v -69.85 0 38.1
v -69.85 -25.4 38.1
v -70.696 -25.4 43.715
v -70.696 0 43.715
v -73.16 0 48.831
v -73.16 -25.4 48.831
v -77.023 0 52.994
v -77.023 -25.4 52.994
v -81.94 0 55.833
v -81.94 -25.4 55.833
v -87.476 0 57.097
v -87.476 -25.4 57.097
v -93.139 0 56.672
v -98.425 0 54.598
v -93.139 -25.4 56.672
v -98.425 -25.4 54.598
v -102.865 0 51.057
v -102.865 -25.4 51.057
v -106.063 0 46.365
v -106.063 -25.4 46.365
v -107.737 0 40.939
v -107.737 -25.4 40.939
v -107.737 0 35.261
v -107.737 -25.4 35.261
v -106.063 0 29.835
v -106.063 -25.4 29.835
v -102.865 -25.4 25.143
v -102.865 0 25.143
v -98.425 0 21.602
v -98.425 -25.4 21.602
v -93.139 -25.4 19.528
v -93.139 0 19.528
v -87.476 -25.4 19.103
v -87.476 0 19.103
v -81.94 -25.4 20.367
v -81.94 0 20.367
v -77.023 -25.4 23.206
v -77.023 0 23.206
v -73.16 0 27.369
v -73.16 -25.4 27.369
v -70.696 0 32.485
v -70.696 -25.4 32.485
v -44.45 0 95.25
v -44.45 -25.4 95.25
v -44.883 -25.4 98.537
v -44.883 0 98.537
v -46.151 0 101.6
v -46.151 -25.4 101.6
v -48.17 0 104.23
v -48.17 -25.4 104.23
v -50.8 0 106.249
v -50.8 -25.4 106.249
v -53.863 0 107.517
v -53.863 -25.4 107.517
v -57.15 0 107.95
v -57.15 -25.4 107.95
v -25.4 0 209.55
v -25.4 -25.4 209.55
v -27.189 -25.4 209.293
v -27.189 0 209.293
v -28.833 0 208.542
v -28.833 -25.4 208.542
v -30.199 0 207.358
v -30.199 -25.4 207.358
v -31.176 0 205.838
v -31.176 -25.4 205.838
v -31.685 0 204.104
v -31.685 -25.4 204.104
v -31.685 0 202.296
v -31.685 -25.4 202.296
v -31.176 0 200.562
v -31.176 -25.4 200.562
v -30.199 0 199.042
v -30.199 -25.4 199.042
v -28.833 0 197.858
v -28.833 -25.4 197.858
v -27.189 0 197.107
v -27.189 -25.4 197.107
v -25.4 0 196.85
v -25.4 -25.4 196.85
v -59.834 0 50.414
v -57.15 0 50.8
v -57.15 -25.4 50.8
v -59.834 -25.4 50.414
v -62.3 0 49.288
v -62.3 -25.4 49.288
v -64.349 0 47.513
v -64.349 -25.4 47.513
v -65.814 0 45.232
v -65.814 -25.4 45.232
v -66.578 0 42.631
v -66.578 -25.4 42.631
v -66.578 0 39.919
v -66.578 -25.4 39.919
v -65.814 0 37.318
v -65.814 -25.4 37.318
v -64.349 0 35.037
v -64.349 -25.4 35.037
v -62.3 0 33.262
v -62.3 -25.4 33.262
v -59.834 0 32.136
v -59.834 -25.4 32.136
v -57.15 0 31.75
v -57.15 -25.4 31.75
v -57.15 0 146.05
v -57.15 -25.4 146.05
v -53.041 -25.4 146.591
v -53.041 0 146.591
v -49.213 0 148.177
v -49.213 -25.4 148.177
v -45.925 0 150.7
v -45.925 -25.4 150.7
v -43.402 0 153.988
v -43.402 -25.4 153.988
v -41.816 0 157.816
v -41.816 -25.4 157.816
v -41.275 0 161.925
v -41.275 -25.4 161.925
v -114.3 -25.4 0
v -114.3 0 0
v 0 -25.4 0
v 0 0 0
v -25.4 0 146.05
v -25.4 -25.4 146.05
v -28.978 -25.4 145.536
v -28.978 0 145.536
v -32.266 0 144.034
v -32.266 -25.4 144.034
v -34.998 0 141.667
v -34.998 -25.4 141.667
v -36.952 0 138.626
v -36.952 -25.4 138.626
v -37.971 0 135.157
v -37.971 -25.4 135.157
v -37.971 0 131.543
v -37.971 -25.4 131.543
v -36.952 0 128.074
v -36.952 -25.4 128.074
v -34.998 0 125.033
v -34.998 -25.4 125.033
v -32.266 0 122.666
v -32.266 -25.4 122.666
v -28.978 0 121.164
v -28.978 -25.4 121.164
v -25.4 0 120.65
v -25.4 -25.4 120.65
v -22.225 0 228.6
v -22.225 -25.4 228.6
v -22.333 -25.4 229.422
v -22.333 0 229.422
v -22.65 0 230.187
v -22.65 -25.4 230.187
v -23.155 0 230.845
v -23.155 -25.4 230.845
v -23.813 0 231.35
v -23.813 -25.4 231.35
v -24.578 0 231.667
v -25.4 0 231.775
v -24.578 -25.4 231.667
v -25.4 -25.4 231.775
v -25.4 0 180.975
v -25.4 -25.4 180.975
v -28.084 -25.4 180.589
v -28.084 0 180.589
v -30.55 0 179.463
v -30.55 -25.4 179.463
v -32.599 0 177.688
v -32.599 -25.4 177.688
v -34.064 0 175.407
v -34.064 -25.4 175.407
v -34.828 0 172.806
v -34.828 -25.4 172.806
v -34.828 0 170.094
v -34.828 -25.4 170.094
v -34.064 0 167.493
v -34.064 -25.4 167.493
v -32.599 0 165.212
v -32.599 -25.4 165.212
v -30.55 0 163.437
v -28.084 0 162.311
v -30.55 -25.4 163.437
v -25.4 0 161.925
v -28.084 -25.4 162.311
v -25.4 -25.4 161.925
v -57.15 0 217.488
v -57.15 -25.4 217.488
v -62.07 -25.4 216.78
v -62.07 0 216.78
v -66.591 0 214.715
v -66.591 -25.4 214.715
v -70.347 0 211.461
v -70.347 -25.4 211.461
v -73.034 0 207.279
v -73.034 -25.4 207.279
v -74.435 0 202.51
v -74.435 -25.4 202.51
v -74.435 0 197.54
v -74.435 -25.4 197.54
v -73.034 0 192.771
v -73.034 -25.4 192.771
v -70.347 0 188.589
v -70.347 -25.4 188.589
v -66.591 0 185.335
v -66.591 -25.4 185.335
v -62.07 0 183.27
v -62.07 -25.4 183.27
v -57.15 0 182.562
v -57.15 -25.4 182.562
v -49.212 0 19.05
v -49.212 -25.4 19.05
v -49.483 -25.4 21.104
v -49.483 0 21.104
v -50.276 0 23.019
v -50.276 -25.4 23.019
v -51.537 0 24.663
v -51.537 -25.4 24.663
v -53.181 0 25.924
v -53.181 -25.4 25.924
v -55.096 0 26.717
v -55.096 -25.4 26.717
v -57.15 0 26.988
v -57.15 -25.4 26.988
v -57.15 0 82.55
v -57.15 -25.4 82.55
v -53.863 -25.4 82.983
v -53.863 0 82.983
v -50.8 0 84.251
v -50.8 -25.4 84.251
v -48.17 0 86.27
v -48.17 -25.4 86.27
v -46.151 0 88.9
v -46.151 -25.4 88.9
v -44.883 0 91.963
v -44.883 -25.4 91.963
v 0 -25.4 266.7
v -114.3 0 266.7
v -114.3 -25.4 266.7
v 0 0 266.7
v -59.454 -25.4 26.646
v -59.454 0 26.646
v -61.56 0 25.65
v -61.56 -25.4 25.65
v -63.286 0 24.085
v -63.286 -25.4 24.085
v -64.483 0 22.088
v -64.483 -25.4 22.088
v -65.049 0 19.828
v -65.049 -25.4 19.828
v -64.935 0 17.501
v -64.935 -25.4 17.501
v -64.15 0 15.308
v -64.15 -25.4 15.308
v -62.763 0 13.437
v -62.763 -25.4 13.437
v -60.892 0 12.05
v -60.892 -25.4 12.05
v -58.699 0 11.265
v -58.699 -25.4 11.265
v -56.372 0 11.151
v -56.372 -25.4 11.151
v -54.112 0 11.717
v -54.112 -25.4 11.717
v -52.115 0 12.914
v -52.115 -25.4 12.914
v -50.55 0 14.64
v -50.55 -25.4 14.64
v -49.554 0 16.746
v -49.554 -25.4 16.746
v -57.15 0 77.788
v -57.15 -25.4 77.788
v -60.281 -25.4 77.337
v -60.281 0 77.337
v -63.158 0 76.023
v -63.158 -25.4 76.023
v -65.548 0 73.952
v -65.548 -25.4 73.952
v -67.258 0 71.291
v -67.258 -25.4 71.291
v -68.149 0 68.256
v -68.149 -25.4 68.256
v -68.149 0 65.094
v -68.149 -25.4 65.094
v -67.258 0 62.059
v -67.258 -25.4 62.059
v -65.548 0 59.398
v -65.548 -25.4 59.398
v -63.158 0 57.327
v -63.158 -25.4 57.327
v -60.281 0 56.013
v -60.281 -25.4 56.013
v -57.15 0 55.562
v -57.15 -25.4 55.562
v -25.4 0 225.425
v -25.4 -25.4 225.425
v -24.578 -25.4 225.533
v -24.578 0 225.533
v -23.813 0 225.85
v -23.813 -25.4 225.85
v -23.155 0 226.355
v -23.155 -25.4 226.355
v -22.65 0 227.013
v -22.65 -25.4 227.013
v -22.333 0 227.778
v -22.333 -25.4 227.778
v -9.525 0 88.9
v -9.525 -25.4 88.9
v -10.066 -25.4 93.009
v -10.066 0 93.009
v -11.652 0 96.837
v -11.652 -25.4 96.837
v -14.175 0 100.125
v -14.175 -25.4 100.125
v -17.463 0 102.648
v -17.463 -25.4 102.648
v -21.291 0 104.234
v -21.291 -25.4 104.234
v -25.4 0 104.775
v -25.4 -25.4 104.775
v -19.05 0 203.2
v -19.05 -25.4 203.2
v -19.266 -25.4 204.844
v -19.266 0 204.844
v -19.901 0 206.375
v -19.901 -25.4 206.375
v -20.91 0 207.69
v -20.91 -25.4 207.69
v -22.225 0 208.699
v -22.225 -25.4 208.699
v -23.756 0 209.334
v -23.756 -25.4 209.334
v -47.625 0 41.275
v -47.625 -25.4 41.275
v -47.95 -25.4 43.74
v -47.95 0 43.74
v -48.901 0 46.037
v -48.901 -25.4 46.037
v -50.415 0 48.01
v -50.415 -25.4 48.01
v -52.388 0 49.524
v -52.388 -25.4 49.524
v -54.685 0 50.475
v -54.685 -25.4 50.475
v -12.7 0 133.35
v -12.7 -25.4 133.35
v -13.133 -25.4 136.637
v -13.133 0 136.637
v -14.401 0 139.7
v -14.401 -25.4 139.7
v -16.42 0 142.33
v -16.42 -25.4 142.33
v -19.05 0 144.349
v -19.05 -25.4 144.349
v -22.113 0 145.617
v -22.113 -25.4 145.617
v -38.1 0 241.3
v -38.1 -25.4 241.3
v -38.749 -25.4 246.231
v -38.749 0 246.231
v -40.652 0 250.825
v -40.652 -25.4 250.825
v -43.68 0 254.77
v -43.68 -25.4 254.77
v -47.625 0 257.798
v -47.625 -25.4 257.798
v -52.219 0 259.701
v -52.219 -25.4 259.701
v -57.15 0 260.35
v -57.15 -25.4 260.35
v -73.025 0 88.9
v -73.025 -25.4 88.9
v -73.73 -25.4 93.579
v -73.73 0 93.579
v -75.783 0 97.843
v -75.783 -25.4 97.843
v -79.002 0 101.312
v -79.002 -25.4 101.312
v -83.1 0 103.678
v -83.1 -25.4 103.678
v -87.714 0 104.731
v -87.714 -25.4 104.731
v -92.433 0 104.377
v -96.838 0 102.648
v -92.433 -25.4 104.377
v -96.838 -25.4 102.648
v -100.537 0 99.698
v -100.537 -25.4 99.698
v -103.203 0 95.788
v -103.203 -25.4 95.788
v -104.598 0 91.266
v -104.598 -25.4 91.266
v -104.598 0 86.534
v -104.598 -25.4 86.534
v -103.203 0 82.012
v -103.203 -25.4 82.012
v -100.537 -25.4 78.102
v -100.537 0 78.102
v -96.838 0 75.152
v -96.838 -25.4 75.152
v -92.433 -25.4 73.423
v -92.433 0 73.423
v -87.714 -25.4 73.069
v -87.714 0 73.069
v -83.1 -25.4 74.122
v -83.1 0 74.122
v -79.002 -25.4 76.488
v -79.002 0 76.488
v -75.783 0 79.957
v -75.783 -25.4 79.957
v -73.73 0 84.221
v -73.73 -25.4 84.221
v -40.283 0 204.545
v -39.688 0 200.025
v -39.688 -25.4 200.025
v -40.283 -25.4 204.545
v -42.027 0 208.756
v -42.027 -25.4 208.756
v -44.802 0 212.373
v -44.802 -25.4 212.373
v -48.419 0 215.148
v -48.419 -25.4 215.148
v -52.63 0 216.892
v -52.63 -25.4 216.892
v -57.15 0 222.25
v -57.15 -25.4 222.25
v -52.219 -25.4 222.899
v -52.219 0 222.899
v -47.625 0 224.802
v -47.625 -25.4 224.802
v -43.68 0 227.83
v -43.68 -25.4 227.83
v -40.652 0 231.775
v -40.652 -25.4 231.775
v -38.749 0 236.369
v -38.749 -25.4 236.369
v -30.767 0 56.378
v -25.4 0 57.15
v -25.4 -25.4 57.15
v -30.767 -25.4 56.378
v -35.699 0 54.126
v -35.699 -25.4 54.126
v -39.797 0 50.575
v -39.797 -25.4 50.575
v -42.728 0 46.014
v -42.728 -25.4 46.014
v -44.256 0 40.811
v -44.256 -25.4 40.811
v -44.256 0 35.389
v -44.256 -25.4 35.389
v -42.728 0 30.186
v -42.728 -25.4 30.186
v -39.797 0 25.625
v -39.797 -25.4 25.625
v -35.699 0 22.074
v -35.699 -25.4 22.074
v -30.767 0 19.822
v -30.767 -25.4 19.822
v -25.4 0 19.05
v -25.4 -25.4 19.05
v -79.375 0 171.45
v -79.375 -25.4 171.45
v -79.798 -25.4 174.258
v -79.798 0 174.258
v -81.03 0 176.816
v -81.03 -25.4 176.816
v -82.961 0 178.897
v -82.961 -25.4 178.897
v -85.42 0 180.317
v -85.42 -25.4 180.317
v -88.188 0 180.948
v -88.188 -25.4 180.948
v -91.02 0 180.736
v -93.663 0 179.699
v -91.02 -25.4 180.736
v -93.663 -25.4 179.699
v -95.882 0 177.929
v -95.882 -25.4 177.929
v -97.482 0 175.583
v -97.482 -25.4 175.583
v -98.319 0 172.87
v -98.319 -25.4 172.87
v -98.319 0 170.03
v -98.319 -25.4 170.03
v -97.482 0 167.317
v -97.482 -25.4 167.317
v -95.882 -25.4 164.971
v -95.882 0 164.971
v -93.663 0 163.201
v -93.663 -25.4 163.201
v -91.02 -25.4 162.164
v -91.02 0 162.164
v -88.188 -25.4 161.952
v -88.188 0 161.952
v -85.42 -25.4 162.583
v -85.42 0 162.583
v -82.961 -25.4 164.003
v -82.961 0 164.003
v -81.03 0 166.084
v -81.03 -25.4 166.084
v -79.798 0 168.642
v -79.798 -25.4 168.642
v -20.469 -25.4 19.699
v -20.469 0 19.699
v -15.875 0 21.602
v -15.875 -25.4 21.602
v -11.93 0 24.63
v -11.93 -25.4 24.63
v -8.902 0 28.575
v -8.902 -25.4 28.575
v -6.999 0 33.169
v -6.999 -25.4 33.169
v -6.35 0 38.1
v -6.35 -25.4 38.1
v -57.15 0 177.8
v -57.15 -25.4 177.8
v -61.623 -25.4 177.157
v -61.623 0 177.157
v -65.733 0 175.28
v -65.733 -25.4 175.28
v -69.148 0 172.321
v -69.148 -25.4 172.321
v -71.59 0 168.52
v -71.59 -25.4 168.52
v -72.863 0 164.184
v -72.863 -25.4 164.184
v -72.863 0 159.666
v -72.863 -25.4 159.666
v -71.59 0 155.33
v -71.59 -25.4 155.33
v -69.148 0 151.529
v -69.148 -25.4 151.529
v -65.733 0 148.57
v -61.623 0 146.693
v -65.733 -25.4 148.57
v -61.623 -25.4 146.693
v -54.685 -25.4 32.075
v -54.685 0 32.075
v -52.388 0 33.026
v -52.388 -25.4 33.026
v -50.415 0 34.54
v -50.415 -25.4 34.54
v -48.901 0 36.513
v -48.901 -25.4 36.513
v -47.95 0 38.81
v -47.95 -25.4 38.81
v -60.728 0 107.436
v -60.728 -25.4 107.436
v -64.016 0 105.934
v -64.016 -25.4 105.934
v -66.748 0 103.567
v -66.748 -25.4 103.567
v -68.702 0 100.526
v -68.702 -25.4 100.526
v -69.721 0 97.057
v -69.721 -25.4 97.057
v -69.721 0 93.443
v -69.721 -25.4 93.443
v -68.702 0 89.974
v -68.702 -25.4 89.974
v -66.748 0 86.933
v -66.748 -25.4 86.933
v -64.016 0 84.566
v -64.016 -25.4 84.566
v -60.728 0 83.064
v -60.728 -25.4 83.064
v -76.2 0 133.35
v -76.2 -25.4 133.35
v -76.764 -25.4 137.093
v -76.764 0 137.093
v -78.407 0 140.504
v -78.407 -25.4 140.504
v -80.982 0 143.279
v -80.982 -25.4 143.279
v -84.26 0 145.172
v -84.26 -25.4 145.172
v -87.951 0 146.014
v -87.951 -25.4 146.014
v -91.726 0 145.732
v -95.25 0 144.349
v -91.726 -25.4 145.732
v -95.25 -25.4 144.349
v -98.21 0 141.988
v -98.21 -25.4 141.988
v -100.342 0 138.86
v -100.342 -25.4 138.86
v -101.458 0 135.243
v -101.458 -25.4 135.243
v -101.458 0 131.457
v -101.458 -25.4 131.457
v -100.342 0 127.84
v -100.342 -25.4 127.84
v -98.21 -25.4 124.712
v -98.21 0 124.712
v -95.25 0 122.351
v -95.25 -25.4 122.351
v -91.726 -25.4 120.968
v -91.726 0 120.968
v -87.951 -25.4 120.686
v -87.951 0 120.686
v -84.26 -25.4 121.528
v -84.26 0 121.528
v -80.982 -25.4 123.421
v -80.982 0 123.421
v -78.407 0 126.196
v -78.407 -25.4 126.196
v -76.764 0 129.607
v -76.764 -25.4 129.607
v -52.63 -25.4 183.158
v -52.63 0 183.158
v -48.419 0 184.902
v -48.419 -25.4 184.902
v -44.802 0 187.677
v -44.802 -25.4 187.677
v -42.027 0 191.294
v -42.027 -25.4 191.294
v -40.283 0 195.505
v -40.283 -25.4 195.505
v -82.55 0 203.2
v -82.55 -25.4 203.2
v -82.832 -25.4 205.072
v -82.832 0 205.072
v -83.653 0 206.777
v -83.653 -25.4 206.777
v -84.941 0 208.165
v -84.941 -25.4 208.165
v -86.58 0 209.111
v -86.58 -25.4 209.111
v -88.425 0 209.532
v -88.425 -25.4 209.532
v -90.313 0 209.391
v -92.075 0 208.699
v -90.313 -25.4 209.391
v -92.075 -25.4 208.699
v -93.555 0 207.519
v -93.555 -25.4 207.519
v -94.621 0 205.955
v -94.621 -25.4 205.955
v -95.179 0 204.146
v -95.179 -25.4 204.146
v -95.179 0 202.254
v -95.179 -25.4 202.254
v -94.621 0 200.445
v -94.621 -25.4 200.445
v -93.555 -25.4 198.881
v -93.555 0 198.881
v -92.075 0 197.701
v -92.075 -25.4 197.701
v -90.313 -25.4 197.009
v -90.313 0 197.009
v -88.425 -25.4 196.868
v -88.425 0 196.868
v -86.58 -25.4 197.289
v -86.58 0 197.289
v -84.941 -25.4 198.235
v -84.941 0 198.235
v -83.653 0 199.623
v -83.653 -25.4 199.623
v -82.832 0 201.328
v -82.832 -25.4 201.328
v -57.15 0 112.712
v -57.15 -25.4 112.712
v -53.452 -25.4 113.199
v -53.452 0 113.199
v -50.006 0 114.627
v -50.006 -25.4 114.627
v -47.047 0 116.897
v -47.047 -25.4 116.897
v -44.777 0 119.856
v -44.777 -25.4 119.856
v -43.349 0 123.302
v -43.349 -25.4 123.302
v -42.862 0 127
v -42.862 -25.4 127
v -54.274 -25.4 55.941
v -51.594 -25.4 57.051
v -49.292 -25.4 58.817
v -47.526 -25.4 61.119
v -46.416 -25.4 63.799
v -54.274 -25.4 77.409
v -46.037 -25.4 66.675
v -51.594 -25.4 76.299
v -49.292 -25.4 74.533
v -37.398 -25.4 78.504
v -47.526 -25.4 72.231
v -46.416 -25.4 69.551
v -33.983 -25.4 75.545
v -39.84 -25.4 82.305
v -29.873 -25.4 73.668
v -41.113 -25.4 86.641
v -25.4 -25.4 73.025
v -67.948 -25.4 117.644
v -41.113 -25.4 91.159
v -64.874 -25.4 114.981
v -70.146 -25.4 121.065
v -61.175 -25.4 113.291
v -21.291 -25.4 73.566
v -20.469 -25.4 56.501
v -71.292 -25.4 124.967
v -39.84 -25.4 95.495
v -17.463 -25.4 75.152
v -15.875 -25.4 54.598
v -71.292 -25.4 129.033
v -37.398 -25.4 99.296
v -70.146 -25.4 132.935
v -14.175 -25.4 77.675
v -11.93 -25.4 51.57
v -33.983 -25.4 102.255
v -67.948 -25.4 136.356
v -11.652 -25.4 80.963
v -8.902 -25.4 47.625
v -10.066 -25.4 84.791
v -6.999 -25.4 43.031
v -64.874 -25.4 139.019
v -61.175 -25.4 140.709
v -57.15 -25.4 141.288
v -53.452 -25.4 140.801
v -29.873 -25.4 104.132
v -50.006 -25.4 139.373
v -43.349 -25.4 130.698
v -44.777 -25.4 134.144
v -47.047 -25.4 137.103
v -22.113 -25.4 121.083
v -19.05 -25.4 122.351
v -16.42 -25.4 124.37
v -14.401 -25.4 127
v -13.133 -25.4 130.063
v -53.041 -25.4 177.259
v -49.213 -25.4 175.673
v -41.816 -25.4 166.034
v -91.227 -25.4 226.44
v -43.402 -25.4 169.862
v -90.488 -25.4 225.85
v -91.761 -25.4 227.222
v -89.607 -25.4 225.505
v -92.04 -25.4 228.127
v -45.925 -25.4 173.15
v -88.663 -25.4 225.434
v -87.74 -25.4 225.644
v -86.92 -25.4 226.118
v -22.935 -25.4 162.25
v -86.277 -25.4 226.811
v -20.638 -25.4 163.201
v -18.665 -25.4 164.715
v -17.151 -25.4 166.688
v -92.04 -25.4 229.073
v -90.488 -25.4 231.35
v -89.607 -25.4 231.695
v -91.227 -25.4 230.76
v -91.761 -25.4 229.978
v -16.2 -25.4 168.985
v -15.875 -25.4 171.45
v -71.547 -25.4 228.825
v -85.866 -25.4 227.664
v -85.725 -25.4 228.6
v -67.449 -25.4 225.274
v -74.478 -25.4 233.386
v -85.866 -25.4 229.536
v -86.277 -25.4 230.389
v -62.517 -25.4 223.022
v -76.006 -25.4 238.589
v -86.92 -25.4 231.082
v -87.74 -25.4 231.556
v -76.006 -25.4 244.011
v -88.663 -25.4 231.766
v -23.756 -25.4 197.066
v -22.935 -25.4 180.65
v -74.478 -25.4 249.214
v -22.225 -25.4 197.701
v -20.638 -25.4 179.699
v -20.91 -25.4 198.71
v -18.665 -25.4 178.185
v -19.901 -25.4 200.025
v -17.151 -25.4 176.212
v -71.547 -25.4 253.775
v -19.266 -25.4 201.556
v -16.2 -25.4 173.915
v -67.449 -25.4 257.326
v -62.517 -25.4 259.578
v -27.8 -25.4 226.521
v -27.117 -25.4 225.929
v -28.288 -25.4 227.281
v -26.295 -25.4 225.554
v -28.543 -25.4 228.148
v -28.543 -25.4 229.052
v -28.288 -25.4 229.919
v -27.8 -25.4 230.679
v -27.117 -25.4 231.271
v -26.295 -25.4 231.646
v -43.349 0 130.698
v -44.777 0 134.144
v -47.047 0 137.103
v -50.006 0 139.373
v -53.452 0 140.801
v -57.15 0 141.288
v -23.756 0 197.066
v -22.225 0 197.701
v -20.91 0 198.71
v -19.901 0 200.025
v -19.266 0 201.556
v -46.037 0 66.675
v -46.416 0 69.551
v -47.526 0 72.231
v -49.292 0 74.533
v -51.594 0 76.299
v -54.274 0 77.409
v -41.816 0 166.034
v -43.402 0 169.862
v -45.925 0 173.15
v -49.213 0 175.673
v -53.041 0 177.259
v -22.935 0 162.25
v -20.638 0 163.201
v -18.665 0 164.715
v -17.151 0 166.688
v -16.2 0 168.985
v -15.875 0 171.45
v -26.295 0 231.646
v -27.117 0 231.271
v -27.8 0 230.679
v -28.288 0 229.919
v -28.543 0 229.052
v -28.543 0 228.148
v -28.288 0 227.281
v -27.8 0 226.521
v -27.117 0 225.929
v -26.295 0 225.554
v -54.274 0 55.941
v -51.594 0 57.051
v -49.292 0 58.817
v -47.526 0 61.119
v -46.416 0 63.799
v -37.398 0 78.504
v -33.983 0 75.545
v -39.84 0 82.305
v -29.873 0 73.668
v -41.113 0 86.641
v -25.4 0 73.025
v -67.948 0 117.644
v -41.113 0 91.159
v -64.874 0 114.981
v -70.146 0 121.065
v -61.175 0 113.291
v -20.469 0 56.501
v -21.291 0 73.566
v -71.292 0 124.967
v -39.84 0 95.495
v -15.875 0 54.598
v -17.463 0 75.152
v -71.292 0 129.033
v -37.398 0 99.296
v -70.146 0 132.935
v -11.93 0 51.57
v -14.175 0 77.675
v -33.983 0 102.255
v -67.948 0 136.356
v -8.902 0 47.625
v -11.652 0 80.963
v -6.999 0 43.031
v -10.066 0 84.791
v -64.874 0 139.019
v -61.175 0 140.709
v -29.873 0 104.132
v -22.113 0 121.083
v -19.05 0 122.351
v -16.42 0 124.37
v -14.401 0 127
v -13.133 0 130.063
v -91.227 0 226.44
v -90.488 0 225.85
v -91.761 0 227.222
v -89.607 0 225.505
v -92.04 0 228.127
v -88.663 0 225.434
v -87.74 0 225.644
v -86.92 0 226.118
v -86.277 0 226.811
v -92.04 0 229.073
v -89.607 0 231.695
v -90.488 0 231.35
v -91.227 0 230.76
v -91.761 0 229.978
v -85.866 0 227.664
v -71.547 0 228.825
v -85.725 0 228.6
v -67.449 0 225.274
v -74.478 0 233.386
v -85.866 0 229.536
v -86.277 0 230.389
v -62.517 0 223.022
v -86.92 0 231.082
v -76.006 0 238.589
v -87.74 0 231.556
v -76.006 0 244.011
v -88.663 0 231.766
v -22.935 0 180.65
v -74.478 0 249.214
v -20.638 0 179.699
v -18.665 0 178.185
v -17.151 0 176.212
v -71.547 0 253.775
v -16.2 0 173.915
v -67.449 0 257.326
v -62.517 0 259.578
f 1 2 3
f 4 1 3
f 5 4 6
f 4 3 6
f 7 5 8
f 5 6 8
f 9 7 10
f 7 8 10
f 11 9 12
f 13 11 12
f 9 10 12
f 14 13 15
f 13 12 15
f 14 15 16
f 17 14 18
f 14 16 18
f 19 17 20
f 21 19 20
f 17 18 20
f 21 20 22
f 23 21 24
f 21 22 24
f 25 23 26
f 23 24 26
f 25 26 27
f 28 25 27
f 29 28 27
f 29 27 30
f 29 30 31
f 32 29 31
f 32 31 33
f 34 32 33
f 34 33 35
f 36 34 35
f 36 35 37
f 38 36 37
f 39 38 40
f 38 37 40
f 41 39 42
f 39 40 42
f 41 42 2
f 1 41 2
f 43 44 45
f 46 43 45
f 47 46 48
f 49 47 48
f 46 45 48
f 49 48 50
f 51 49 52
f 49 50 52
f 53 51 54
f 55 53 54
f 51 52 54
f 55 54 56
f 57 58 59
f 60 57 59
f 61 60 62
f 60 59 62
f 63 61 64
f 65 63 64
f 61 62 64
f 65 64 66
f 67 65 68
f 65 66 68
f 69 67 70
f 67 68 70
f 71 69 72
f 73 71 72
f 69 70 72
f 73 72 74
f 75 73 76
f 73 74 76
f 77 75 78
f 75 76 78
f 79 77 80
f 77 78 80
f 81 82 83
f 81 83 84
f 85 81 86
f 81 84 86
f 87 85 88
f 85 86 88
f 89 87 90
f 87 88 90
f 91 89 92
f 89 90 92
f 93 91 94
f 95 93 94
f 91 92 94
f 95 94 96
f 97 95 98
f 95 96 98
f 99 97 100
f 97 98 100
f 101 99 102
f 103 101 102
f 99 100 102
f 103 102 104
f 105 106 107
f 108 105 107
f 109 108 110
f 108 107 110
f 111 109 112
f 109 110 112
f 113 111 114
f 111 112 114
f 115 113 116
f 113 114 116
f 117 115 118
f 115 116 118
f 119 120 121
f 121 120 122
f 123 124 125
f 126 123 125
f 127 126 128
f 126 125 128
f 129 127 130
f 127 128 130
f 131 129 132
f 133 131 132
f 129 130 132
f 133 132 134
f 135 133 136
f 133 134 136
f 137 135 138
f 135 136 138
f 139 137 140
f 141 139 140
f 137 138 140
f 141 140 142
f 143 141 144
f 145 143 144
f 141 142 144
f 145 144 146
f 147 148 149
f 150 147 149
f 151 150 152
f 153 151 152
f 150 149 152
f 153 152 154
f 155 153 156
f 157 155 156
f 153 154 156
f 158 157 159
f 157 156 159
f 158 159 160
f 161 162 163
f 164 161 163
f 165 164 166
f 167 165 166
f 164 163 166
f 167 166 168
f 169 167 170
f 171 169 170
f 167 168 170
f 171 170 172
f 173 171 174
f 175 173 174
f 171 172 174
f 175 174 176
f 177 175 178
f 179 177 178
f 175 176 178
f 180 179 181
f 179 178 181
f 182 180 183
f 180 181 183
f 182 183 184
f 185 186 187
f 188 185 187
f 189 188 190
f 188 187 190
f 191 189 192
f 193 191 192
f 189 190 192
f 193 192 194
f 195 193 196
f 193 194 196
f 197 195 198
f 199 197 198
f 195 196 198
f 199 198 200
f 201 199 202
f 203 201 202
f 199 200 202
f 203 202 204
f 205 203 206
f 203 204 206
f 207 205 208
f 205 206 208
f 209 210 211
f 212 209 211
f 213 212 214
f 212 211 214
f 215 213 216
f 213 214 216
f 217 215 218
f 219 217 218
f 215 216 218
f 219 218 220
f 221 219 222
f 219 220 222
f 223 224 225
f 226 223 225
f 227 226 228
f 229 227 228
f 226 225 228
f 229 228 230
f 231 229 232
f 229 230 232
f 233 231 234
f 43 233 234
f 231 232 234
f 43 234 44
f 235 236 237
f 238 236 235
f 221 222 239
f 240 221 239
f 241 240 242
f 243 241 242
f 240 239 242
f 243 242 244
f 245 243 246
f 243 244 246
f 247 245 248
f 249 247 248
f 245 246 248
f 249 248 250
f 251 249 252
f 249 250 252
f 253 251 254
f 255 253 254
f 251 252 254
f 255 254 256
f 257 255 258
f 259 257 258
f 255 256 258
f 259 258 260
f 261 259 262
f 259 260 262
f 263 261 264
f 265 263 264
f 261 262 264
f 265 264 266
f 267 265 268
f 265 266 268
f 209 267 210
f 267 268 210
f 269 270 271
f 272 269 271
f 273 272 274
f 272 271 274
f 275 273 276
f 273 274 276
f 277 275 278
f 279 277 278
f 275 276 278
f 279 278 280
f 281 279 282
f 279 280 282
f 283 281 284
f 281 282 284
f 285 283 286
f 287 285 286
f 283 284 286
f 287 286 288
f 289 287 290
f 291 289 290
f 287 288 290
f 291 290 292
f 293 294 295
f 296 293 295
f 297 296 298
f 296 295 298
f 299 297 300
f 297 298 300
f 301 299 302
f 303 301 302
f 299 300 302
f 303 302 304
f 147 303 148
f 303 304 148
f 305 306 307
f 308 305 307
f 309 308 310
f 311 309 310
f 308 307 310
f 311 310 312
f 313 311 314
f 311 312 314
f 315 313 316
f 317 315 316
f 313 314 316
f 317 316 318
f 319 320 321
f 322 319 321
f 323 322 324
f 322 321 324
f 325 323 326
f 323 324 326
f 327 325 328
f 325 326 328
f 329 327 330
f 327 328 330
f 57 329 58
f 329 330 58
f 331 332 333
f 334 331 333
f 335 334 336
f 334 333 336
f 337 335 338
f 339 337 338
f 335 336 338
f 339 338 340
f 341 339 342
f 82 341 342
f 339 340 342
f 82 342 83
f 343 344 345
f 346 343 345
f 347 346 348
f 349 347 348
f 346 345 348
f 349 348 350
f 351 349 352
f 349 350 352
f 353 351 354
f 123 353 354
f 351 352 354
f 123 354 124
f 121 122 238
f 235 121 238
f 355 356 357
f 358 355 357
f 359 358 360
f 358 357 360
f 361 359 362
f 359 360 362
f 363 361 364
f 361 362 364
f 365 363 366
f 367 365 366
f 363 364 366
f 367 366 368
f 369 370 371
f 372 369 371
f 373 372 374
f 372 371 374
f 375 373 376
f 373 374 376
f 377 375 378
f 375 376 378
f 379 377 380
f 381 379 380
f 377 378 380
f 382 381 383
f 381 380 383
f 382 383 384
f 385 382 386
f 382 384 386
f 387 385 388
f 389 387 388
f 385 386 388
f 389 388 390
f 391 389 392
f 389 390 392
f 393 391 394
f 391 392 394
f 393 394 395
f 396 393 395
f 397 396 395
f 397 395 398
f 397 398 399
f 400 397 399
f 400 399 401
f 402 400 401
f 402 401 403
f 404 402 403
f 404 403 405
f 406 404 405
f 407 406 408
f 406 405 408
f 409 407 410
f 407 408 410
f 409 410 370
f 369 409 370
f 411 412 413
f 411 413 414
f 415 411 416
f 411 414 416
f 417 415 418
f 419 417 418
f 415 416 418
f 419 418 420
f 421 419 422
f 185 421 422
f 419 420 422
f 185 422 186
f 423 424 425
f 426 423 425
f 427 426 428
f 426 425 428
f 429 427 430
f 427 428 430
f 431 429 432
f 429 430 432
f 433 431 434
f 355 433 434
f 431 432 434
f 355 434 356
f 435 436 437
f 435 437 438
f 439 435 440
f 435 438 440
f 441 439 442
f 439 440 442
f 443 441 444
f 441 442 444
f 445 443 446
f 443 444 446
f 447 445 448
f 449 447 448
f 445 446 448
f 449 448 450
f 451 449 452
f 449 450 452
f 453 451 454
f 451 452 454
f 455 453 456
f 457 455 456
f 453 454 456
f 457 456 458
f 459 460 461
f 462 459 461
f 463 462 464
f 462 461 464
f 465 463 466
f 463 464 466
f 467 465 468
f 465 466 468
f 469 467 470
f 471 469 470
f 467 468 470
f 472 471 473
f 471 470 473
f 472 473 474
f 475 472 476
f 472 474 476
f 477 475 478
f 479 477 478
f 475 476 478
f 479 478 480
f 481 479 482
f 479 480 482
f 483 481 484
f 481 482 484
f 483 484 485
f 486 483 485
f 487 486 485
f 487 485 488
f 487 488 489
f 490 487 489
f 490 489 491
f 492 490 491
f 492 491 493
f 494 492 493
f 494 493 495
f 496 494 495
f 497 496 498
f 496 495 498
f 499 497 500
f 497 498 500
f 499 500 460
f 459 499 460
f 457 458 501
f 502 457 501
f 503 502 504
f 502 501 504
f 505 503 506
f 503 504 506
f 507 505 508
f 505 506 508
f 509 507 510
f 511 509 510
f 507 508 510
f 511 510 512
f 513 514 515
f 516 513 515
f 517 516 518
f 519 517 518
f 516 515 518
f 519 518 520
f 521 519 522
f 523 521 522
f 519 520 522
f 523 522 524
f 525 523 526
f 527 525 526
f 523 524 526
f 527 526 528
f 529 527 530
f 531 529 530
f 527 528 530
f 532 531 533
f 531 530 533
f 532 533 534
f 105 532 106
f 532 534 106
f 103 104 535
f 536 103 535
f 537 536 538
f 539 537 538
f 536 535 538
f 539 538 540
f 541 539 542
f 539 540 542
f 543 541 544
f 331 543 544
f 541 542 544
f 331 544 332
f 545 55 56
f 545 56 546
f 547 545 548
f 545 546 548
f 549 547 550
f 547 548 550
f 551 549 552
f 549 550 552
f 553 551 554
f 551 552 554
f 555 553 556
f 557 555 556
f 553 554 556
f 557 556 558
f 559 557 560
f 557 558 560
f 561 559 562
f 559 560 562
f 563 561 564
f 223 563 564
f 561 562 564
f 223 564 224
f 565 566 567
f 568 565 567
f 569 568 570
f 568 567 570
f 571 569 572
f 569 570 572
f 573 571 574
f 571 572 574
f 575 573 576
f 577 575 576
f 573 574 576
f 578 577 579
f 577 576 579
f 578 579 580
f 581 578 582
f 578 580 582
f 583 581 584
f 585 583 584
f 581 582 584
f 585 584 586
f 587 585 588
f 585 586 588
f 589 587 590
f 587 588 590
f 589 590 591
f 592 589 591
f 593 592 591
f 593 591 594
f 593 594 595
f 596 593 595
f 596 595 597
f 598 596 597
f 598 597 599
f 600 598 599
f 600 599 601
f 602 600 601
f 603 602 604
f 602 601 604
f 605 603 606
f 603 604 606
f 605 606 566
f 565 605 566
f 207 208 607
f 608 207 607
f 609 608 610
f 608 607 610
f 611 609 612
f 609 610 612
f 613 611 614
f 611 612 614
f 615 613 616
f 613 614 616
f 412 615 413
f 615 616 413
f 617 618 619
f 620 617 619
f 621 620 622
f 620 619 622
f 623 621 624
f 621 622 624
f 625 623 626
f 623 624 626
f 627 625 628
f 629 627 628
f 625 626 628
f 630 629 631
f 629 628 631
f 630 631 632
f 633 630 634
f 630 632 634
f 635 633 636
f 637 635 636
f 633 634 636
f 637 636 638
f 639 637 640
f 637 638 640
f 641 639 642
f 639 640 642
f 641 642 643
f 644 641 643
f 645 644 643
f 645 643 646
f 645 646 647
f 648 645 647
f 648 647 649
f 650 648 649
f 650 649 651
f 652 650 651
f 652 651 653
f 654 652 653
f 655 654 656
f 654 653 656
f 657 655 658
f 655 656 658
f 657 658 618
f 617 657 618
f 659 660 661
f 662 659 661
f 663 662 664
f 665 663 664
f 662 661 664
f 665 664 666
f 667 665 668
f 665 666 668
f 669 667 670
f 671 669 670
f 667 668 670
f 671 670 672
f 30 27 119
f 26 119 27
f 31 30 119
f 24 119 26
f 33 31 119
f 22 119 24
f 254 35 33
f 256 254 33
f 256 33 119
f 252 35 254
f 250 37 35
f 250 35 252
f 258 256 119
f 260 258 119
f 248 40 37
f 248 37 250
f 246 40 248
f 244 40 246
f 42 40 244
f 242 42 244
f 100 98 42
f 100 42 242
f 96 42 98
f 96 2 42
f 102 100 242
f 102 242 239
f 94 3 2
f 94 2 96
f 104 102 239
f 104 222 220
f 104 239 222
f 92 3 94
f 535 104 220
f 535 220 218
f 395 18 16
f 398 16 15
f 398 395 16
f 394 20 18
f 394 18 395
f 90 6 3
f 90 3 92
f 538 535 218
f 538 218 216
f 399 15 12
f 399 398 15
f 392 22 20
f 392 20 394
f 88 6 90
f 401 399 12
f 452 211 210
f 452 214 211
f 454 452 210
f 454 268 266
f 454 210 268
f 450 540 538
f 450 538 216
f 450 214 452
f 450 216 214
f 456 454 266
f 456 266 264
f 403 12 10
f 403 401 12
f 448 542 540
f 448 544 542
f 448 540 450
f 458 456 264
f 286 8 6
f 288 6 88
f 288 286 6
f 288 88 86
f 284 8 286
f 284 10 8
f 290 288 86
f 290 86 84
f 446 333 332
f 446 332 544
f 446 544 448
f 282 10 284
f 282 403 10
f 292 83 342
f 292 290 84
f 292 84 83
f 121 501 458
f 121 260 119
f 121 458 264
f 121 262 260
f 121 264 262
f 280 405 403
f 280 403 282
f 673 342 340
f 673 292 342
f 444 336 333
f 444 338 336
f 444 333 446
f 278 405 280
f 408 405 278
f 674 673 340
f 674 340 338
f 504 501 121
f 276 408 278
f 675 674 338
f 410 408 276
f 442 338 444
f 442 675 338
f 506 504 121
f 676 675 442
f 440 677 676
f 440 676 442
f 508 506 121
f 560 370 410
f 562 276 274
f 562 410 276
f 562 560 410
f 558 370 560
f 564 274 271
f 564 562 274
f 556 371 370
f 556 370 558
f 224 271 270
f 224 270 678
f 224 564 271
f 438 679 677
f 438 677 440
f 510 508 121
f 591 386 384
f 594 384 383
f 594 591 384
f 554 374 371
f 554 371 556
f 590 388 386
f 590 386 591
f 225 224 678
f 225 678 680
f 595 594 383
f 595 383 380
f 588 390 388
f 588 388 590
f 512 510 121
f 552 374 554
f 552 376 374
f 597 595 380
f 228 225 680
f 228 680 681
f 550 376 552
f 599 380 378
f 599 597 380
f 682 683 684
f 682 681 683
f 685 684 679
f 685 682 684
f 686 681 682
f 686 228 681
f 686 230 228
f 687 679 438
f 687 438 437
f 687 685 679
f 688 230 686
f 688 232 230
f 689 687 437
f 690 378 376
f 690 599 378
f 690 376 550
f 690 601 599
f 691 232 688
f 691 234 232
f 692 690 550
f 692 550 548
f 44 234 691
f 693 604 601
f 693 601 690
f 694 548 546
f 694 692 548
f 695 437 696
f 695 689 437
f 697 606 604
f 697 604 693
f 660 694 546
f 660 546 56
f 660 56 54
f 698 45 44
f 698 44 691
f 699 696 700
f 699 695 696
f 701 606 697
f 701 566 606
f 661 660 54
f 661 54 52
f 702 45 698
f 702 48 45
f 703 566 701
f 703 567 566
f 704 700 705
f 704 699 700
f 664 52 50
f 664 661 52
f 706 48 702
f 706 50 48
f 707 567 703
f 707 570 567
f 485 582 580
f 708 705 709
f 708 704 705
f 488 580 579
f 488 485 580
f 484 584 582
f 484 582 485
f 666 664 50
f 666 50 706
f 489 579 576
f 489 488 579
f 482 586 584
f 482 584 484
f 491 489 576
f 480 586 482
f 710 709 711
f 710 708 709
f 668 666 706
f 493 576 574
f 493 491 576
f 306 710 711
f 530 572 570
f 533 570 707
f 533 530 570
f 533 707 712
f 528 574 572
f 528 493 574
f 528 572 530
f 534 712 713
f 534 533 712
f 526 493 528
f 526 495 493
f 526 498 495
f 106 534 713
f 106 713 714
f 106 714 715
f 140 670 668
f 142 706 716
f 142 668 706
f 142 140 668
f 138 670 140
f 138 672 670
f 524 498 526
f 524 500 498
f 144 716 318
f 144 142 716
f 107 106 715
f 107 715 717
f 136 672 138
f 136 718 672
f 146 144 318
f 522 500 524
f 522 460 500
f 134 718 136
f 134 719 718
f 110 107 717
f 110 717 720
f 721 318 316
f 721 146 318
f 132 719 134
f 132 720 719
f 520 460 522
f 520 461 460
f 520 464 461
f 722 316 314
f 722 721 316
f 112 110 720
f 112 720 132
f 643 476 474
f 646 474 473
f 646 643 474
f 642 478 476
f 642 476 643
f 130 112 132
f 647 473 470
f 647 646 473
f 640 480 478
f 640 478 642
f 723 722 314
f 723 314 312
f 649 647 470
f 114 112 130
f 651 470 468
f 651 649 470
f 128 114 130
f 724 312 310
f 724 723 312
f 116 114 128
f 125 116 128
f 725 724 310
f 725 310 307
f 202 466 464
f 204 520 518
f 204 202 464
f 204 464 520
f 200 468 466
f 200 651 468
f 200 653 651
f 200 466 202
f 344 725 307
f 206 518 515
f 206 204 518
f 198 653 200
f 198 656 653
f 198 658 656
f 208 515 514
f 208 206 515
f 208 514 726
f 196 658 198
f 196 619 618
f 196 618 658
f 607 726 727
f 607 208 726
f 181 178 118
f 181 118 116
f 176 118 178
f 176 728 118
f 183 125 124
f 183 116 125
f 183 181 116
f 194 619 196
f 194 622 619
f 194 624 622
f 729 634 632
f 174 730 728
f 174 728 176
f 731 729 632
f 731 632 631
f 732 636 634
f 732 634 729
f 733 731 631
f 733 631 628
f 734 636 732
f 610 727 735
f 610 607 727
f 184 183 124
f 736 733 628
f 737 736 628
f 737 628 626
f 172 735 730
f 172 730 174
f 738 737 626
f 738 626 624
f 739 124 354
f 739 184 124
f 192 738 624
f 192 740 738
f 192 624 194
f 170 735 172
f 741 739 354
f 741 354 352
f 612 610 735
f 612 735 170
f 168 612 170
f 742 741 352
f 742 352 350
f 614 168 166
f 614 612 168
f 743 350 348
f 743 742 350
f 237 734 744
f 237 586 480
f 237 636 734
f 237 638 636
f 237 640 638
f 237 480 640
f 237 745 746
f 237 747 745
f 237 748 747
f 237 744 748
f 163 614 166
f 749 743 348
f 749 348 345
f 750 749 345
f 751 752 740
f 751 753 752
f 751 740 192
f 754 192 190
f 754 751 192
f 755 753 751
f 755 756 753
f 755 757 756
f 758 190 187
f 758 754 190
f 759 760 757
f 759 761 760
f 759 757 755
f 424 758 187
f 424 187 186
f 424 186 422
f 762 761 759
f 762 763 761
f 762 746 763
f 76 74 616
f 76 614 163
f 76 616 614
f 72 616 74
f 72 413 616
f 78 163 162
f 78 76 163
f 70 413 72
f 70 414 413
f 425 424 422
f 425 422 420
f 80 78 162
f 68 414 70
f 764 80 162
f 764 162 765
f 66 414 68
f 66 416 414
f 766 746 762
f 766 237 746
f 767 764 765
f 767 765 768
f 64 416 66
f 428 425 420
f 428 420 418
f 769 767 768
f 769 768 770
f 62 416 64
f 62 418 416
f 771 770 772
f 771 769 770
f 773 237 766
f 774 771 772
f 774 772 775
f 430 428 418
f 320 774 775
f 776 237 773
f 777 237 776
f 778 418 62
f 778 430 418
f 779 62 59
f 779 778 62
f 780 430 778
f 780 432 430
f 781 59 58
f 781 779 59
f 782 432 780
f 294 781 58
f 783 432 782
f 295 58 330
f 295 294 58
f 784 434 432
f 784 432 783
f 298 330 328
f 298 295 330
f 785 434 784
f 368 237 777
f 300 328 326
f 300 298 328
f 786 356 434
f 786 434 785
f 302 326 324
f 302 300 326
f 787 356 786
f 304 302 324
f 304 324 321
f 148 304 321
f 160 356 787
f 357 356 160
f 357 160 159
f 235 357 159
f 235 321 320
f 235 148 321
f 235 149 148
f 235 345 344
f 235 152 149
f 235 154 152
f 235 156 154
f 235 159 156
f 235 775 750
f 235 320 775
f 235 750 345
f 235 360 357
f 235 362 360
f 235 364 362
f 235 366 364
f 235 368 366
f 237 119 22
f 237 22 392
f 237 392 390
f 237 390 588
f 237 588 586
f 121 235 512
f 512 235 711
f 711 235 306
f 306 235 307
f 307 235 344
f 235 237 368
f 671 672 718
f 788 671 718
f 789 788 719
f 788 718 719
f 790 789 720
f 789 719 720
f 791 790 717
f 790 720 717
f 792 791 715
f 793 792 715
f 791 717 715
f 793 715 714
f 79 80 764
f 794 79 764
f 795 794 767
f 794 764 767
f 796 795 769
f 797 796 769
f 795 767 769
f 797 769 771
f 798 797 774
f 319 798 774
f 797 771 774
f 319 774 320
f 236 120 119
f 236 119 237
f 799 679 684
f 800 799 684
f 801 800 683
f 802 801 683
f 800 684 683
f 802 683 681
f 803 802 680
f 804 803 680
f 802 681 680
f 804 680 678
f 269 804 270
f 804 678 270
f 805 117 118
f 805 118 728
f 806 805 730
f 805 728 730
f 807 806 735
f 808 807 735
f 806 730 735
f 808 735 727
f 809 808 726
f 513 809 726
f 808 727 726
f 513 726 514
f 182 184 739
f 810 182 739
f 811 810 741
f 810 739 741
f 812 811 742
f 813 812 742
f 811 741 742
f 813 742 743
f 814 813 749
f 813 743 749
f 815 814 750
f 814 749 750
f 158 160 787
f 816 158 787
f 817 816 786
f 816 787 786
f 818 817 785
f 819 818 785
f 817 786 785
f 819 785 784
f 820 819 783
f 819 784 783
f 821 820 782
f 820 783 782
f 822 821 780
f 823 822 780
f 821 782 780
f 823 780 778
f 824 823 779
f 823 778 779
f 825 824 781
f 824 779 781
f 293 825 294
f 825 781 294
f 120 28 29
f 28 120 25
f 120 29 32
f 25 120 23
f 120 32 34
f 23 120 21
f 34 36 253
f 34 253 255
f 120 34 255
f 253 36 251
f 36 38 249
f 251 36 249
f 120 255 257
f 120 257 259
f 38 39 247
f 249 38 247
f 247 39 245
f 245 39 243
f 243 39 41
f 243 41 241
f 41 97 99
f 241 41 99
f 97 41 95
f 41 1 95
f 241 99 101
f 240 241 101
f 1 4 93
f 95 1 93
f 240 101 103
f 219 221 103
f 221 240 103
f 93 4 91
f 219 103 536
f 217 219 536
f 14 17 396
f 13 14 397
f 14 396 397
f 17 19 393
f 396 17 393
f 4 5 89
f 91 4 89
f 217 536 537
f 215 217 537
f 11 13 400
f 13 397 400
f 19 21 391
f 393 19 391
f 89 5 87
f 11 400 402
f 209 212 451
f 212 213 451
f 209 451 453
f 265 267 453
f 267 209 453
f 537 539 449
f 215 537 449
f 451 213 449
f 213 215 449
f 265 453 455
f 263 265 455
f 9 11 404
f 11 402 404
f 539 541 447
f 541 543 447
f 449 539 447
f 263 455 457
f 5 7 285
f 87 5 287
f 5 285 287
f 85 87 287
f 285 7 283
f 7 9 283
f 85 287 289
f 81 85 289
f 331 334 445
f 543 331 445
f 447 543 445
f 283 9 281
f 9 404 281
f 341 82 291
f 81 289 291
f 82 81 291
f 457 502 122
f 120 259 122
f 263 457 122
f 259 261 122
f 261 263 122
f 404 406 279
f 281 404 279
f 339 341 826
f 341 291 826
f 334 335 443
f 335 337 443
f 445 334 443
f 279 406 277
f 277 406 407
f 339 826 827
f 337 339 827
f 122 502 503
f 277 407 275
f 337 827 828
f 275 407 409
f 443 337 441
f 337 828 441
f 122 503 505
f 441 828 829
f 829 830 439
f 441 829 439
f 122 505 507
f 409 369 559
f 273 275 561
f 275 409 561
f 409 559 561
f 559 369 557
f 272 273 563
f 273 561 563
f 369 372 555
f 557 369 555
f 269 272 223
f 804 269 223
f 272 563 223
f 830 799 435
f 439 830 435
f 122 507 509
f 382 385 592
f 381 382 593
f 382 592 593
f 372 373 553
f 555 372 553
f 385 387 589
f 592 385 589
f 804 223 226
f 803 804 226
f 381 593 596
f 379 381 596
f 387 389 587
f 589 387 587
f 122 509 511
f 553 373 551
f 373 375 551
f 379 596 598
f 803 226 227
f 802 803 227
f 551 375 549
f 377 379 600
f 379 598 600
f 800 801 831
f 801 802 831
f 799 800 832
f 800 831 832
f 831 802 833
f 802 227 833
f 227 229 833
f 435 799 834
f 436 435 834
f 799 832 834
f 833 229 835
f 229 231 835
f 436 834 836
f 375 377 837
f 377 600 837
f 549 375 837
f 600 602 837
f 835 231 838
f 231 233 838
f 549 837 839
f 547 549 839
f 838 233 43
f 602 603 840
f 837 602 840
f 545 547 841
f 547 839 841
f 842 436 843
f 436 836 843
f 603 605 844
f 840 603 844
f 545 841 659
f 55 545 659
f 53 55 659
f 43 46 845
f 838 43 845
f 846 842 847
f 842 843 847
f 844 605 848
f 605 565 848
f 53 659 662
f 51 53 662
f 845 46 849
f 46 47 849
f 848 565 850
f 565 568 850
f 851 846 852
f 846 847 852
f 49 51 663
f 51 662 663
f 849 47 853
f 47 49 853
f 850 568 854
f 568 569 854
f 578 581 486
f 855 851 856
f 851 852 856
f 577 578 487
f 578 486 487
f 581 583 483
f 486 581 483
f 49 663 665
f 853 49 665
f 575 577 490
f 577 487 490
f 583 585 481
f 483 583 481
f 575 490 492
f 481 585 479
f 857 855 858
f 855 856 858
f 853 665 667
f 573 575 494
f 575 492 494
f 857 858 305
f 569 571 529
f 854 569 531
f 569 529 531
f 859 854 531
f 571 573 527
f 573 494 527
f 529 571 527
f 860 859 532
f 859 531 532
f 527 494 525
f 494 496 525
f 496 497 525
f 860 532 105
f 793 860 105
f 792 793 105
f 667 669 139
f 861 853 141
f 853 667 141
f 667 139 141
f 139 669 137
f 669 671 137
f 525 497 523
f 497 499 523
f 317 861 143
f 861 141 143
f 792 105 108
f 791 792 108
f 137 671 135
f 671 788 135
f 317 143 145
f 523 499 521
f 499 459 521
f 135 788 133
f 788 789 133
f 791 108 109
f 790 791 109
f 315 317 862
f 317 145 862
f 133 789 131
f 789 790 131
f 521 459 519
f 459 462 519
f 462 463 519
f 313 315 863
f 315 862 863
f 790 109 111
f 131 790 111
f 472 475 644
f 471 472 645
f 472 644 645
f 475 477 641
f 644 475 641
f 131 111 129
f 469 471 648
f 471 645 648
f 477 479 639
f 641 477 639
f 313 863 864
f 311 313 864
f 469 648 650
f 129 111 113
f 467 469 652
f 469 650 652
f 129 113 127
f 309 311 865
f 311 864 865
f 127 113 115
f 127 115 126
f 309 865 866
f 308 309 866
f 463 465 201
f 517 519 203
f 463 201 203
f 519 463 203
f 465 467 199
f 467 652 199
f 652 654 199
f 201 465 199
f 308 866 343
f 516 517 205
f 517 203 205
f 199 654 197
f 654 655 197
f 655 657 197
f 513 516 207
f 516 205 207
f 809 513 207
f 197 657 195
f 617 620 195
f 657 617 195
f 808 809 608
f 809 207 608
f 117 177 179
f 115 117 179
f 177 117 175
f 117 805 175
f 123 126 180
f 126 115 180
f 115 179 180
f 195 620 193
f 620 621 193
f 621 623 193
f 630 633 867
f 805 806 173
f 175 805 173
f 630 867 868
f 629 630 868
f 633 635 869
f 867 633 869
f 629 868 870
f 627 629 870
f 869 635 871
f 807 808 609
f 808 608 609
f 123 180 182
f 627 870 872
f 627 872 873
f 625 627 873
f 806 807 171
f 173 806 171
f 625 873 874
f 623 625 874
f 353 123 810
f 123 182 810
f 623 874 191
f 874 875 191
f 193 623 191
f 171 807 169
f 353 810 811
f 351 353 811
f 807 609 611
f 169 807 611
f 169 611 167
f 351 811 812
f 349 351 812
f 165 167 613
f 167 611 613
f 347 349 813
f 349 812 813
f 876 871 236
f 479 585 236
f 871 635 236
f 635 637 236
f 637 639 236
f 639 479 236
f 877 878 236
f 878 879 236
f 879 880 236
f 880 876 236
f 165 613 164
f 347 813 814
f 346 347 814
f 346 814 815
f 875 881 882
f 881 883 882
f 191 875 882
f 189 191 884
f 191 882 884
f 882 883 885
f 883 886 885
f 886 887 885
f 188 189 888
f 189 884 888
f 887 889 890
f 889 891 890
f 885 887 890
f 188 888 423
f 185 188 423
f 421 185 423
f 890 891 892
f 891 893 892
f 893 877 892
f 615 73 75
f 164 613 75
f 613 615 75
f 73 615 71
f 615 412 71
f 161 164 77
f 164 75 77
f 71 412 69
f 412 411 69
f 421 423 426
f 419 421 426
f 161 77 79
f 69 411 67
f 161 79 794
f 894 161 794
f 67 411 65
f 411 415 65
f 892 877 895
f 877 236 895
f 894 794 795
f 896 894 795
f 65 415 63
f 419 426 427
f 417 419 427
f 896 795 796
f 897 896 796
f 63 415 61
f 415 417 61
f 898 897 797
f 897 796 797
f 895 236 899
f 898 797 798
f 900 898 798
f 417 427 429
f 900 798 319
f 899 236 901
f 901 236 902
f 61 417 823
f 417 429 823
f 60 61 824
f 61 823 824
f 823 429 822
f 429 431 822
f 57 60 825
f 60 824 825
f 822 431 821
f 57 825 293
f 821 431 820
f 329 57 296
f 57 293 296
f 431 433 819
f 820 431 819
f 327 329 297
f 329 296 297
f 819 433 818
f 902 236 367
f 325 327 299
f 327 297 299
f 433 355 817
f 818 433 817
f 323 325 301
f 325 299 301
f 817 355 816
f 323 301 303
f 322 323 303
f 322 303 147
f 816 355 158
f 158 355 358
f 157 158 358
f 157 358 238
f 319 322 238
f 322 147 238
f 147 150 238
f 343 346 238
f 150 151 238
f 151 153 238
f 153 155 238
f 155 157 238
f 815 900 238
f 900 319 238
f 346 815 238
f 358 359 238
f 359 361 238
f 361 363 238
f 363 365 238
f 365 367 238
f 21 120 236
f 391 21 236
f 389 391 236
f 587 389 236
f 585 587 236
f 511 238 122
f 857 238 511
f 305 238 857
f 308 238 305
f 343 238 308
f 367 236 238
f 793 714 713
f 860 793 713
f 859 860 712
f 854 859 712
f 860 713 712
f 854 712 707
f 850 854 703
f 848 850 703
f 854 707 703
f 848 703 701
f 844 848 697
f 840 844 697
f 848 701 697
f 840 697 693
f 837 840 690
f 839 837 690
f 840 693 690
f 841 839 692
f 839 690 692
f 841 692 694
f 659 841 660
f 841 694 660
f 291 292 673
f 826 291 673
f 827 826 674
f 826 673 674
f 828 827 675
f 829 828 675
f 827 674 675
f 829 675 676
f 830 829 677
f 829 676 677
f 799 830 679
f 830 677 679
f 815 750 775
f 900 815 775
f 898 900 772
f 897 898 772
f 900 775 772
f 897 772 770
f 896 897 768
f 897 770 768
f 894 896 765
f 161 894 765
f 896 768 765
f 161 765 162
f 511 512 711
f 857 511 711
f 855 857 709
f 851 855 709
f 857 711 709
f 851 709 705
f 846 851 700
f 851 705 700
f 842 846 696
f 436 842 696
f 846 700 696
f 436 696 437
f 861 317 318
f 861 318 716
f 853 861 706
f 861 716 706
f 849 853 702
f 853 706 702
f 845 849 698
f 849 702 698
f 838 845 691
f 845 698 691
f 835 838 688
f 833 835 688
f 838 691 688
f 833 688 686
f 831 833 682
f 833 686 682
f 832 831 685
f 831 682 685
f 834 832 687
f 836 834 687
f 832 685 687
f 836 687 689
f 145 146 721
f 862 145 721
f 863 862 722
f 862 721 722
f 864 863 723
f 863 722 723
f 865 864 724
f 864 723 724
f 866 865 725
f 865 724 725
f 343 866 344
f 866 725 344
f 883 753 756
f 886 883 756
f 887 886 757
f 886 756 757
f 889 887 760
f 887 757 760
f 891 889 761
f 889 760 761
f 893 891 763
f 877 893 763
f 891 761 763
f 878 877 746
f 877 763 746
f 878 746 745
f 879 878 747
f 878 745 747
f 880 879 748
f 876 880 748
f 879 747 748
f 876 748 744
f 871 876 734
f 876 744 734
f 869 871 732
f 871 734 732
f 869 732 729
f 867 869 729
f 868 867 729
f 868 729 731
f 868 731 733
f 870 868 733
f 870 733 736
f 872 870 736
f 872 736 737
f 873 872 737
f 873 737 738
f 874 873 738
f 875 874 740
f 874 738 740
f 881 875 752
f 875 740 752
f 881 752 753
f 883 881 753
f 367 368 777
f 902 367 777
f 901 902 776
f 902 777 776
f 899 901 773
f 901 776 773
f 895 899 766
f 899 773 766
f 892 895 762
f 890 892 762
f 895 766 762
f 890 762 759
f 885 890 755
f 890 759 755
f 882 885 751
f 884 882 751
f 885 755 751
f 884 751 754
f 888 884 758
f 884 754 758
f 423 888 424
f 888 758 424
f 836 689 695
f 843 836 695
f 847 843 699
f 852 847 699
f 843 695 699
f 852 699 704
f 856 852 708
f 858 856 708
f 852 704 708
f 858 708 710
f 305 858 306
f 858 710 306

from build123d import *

# Parameters (mm, degrees)
F0_W     = 114.3
F0_H     = 266.7
F1_DEPTH = 25.4
F2_R     = 3.175
F2_R_2   = 6.35
F2_R_3   = 9.525
F2_R_4   = 12.7
F2_R_5   = 15.875
F2_R_6   = 19.05
F3_DEPTH = 25.4
F5_DEPTH = 25.4


with BuildPart() as f1:
    # F0 (on Front) → F1 (new body)
    with BuildSketch(Plane.XZ):
        with Locations((-57.15, 133.35)):
            Rectangle(F0_W, F0_H)
    extrude(amount=F1_DEPTH)

    # F2 (on face) → F3 (cut)
    with BuildSketch(Plane.XZ.offset(25.4)):
        with BuildLine():
            ThreePointArc((-25.4, 57.15), (-44.45, 38.1), (-25.4, 19.05))
            Line((-25.4, 19.05), (-25.4, 38.1))
            Line((-25.4, 38.1), (-25.4, 57.15))
        make_face()
        with BuildLine():
            ThreePointArc((-25.4, 231.775), (-28.575, 228.6), (-25.4, 225.425))
            Line((-25.4, 225.425), (-25.4, 228.6))
            Line((-25.4, 228.6), (-25.4, 231.775))
        make_face()
        with BuildLine():
            Line((-25.4, 228.6), (-25.4, 225.425))
            ThreePointArc((-25.4, 225.425), (-23.154936, 226.354936), (-22.225, 228.6))
            ThreePointArc((-22.225, 228.6), (-23.154936, 230.845064), (-25.4, 231.775))
            Line((-25.4, 231.775), (-25.4, 228.6))
        make_face()
        with BuildLine():
            ThreePointArc((-25.4, 209.55), (-31.75, 203.2), (-25.4, 196.85))
            Line((-25.4, 196.85), (-25.4, 203.2))
            Line((-25.4, 203.2), (-25.4, 209.55))
        make_face()
        with BuildLine():
            Line((-25.4, 203.2), (-25.4, 196.85))
            ThreePointArc((-25.4, 196.85), (-20.909872, 198.709872), (-19.05, 203.2))
            ThreePointArc((-19.05, 203.2), (-20.909872, 207.690128), (-25.4, 209.55))
            Line((-25.4, 209.55), (-25.4, 203.2))
        make_face()
        with BuildLine():
            ThreePointArc((-25.4, 180.975), (-34.925, 171.45), (-25.4, 161.925))
            Line((-25.4, 161.925), (-25.4, 171.45))
            Line((-25.4, 171.45), (-25.4, 180.975))
        make_face()
        with BuildLine():
            Line((-25.4, 171.45), (-25.4, 161.925))
            ThreePointArc((-25.4, 161.925), (-18.664808, 164.714808), (-15.875, 171.45))
            ThreePointArc((-15.875, 171.45), (-18.664808, 178.185192), (-25.4, 180.975))
            Line((-25.4, 180.975), (-25.4, 171.45))
        make_face()
        with BuildLine():
            ThreePointArc((-25.4, 146.05), (-38.1, 133.35), (-25.4, 120.65))
            Line((-25.4, 120.65), (-25.4, 133.35))
            Line((-25.4, 133.35), (-25.4, 146.05))
        make_face()
        with BuildLine():
            Line((-25.4, 133.35), (-25.4, 120.65))
            ThreePointArc((-25.4, 120.65), (-16.419744, 124.369744), (-12.7, 133.35))
            ThreePointArc((-12.7, 133.35), (-16.419744, 142.330256), (-25.4, 146.05))
            Line((-25.4, 146.05), (-25.4, 133.35))
        make_face()
        with BuildLine():
            ThreePointArc((-25.4, 104.775), (-41.275, 88.9), (-25.4, 73.025))
            Line((-25.4, 73.025), (-25.4, 88.9))
            Line((-25.4, 88.9), (-25.4, 104.775))
        make_face()
        with BuildLine():
            Line((-25.4, 88.9), (-25.4, 73.025))
            ThreePointArc((-25.4, 73.025), (-14.17468, 77.67468), (-9.525, 88.9))
            ThreePointArc((-9.525, 88.9), (-14.17468, 100.12532), (-25.4, 104.775))
            Line((-25.4, 104.775), (-25.4, 88.9))
        make_face()
        with BuildLine():
            Line((-25.4, 38.1), (-25.4, 19.05))
            ThreePointArc((-25.4, 19.05), (-11.929616, 24.629616), (-6.35, 38.1))
            ThreePointArc((-6.35, 38.1), (-11.929616, 51.570384), (-25.4, 57.15))
            Line((-25.4, 57.15), (-25.4, 38.1))
        make_face()
        with Locations((-88.9, 228.6)):
            Circle(F2_R)
        with Locations((-88.9, 203.2)):
            Circle(F2_R_2)
        with Locations((-88.9, 171.45)):
            Circle(F2_R_3)
        with Locations((-88.9, 133.35)):
            Circle(F2_R_4)
        with Locations((-88.9, 88.9)):
            Circle(F2_R_5)
        with Locations((-88.9, 38.1)):
            Circle(F2_R_6)
    extrude(amount=-F3_DEPTH, mode=Mode.SUBTRACT)

    # F4 (on face) → F5 (cut)
    with BuildSketch(Plane.XZ.offset(25.4)):
        with BuildLine():
            ThreePointArc((-57.15, 260.35), (-76.2, 241.3), (-57.15, 222.25))
            Line((-57.15, 222.25), (-57.15, 241.3))
            Line((-57.15, 241.3), (-57.15, 260.35))
        make_face()
        with BuildLine():
            Line((-57.15, 241.3), (-57.15, 222.25))
            ThreePointArc((-57.15, 222.25), (-43.679616, 227.829616), (-38.1, 241.3))
            ThreePointArc((-38.1, 241.3), (-43.679616, 254.770384), (-57.15, 260.35))
            Line((-57.15, 260.35), (-57.15, 241.3))
        make_face()
        with BuildLine():
            ThreePointArc((-57.15, 217.4875), (-74.6125, 200.025), (-57.15, 182.5625))
            Line((-57.15, 182.5625), (-57.15, 200.025))
            Line((-57.15, 200.025), (-57.15, 217.4875))
        make_face()
        with BuildLine():
            Line((-57.15, 200.025), (-57.15, 182.5625))
            ThreePointArc((-57.15, 182.5625), (-44.802148, 187.677148), (-39.6875, 200.025))
            ThreePointArc((-39.6875, 200.025), (-44.802148, 212.372852), (-57.15, 217.4875))
            Line((-57.15, 217.4875), (-57.15, 200.025))
        make_face()
        with BuildLine():
            ThreePointArc((-57.15, 177.8), (-73.025, 161.925), (-57.15, 146.05))
            Line((-57.15, 146.05), (-57.15, 161.925))
            Line((-57.15, 161.925), (-57.15, 177.8))
        make_face()
        with BuildLine():
            Line((-57.15, 161.925), (-57.15, 146.05))
            ThreePointArc((-57.15, 146.05), (-45.92468, 150.69968), (-41.275, 161.925))
            ThreePointArc((-41.275, 161.925), (-45.92468, 173.15032), (-57.15, 177.8))
            Line((-57.15, 177.8), (-57.15, 161.925))
        make_face()
        with BuildLine():
            ThreePointArc((-57.15, 141.2875), (-71.4375, 127), (-57.15, 112.7125))
            Line((-57.15, 112.7125), (-57.15, 127))
            Line((-57.15, 127), (-57.15, 141.2875))
        make_face()
        with BuildLine():
            Line((-57.15, 127), (-57.15, 112.7125))
            ThreePointArc((-57.15, 112.7125), (-47.047212, 116.897212), (-42.8625, 127))
            ThreePointArc((-42.8625, 127), (-47.047212, 137.102788), (-57.15, 141.2875))
            Line((-57.15, 141.2875), (-57.15, 127))
        make_face()
        with BuildLine():
            ThreePointArc((-57.15, 107.95), (-69.85, 95.25), (-57.15, 82.55))
            Line((-57.15, 82.55), (-57.15, 95.25))
            Line((-57.15, 95.25), (-57.15, 107.95))
        make_face()
        with BuildLine():
            Line((-57.15, 95.25), (-57.15, 82.55))
            ThreePointArc((-57.15, 82.55), (-48.169744, 86.269744), (-44.45, 95.25))
            ThreePointArc((-44.45, 95.25), (-48.169744, 104.230256), (-57.15, 107.95))
            Line((-57.15, 107.95), (-57.15, 95.25))
        make_face()
        with BuildLine():
            ThreePointArc((-57.15, 77.7875), (-68.2625, 66.675), (-57.15, 55.5625))
            Line((-57.15, 55.5625), (-57.15, 66.675))
            Line((-57.15, 66.675), (-57.15, 77.7875))
        make_face()
        with BuildLine():
            Line((-57.15, 66.675), (-57.15, 55.5625))
            ThreePointArc((-57.15, 55.5625), (-49.292276, 58.817276), (-46.0375, 66.675))
            ThreePointArc((-46.0375, 66.675), (-49.292276, 74.532724), (-57.15, 77.7875))
            Line((-57.15, 77.7875), (-57.15, 66.675))
        make_face()
        with BuildLine():
            ThreePointArc((-57.15, 50.8), (-66.675, 41.275), (-57.15, 31.75))
            Line((-57.15, 31.75), (-57.15, 41.275))
            Line((-57.15, 41.275), (-57.15, 50.8))
        make_face()
        with BuildLine():
            Line((-57.15, 41.275), (-57.15, 31.75))
            ThreePointArc((-57.15, 31.75), (-50.414808, 34.539808), (-47.625, 41.275))
            ThreePointArc((-47.625, 41.275), (-50.414808, 48.010192), (-57.15, 50.8))
            Line((-57.15, 50.8), (-57.15, 41.275))
        make_face()
        with BuildLine():
            ThreePointArc((-49.2125, 19.05), (-51.53734, 24.66266), (-57.15, 26.9875))
            ThreePointArc((-57.15, 26.9875), (-62.76266, 13.43734), (-49.2125, 19.05))
        make_face()
    extrude(amount=-F5_DEPTH, mode=Mode.SUBTRACT)


solid = f1.part
